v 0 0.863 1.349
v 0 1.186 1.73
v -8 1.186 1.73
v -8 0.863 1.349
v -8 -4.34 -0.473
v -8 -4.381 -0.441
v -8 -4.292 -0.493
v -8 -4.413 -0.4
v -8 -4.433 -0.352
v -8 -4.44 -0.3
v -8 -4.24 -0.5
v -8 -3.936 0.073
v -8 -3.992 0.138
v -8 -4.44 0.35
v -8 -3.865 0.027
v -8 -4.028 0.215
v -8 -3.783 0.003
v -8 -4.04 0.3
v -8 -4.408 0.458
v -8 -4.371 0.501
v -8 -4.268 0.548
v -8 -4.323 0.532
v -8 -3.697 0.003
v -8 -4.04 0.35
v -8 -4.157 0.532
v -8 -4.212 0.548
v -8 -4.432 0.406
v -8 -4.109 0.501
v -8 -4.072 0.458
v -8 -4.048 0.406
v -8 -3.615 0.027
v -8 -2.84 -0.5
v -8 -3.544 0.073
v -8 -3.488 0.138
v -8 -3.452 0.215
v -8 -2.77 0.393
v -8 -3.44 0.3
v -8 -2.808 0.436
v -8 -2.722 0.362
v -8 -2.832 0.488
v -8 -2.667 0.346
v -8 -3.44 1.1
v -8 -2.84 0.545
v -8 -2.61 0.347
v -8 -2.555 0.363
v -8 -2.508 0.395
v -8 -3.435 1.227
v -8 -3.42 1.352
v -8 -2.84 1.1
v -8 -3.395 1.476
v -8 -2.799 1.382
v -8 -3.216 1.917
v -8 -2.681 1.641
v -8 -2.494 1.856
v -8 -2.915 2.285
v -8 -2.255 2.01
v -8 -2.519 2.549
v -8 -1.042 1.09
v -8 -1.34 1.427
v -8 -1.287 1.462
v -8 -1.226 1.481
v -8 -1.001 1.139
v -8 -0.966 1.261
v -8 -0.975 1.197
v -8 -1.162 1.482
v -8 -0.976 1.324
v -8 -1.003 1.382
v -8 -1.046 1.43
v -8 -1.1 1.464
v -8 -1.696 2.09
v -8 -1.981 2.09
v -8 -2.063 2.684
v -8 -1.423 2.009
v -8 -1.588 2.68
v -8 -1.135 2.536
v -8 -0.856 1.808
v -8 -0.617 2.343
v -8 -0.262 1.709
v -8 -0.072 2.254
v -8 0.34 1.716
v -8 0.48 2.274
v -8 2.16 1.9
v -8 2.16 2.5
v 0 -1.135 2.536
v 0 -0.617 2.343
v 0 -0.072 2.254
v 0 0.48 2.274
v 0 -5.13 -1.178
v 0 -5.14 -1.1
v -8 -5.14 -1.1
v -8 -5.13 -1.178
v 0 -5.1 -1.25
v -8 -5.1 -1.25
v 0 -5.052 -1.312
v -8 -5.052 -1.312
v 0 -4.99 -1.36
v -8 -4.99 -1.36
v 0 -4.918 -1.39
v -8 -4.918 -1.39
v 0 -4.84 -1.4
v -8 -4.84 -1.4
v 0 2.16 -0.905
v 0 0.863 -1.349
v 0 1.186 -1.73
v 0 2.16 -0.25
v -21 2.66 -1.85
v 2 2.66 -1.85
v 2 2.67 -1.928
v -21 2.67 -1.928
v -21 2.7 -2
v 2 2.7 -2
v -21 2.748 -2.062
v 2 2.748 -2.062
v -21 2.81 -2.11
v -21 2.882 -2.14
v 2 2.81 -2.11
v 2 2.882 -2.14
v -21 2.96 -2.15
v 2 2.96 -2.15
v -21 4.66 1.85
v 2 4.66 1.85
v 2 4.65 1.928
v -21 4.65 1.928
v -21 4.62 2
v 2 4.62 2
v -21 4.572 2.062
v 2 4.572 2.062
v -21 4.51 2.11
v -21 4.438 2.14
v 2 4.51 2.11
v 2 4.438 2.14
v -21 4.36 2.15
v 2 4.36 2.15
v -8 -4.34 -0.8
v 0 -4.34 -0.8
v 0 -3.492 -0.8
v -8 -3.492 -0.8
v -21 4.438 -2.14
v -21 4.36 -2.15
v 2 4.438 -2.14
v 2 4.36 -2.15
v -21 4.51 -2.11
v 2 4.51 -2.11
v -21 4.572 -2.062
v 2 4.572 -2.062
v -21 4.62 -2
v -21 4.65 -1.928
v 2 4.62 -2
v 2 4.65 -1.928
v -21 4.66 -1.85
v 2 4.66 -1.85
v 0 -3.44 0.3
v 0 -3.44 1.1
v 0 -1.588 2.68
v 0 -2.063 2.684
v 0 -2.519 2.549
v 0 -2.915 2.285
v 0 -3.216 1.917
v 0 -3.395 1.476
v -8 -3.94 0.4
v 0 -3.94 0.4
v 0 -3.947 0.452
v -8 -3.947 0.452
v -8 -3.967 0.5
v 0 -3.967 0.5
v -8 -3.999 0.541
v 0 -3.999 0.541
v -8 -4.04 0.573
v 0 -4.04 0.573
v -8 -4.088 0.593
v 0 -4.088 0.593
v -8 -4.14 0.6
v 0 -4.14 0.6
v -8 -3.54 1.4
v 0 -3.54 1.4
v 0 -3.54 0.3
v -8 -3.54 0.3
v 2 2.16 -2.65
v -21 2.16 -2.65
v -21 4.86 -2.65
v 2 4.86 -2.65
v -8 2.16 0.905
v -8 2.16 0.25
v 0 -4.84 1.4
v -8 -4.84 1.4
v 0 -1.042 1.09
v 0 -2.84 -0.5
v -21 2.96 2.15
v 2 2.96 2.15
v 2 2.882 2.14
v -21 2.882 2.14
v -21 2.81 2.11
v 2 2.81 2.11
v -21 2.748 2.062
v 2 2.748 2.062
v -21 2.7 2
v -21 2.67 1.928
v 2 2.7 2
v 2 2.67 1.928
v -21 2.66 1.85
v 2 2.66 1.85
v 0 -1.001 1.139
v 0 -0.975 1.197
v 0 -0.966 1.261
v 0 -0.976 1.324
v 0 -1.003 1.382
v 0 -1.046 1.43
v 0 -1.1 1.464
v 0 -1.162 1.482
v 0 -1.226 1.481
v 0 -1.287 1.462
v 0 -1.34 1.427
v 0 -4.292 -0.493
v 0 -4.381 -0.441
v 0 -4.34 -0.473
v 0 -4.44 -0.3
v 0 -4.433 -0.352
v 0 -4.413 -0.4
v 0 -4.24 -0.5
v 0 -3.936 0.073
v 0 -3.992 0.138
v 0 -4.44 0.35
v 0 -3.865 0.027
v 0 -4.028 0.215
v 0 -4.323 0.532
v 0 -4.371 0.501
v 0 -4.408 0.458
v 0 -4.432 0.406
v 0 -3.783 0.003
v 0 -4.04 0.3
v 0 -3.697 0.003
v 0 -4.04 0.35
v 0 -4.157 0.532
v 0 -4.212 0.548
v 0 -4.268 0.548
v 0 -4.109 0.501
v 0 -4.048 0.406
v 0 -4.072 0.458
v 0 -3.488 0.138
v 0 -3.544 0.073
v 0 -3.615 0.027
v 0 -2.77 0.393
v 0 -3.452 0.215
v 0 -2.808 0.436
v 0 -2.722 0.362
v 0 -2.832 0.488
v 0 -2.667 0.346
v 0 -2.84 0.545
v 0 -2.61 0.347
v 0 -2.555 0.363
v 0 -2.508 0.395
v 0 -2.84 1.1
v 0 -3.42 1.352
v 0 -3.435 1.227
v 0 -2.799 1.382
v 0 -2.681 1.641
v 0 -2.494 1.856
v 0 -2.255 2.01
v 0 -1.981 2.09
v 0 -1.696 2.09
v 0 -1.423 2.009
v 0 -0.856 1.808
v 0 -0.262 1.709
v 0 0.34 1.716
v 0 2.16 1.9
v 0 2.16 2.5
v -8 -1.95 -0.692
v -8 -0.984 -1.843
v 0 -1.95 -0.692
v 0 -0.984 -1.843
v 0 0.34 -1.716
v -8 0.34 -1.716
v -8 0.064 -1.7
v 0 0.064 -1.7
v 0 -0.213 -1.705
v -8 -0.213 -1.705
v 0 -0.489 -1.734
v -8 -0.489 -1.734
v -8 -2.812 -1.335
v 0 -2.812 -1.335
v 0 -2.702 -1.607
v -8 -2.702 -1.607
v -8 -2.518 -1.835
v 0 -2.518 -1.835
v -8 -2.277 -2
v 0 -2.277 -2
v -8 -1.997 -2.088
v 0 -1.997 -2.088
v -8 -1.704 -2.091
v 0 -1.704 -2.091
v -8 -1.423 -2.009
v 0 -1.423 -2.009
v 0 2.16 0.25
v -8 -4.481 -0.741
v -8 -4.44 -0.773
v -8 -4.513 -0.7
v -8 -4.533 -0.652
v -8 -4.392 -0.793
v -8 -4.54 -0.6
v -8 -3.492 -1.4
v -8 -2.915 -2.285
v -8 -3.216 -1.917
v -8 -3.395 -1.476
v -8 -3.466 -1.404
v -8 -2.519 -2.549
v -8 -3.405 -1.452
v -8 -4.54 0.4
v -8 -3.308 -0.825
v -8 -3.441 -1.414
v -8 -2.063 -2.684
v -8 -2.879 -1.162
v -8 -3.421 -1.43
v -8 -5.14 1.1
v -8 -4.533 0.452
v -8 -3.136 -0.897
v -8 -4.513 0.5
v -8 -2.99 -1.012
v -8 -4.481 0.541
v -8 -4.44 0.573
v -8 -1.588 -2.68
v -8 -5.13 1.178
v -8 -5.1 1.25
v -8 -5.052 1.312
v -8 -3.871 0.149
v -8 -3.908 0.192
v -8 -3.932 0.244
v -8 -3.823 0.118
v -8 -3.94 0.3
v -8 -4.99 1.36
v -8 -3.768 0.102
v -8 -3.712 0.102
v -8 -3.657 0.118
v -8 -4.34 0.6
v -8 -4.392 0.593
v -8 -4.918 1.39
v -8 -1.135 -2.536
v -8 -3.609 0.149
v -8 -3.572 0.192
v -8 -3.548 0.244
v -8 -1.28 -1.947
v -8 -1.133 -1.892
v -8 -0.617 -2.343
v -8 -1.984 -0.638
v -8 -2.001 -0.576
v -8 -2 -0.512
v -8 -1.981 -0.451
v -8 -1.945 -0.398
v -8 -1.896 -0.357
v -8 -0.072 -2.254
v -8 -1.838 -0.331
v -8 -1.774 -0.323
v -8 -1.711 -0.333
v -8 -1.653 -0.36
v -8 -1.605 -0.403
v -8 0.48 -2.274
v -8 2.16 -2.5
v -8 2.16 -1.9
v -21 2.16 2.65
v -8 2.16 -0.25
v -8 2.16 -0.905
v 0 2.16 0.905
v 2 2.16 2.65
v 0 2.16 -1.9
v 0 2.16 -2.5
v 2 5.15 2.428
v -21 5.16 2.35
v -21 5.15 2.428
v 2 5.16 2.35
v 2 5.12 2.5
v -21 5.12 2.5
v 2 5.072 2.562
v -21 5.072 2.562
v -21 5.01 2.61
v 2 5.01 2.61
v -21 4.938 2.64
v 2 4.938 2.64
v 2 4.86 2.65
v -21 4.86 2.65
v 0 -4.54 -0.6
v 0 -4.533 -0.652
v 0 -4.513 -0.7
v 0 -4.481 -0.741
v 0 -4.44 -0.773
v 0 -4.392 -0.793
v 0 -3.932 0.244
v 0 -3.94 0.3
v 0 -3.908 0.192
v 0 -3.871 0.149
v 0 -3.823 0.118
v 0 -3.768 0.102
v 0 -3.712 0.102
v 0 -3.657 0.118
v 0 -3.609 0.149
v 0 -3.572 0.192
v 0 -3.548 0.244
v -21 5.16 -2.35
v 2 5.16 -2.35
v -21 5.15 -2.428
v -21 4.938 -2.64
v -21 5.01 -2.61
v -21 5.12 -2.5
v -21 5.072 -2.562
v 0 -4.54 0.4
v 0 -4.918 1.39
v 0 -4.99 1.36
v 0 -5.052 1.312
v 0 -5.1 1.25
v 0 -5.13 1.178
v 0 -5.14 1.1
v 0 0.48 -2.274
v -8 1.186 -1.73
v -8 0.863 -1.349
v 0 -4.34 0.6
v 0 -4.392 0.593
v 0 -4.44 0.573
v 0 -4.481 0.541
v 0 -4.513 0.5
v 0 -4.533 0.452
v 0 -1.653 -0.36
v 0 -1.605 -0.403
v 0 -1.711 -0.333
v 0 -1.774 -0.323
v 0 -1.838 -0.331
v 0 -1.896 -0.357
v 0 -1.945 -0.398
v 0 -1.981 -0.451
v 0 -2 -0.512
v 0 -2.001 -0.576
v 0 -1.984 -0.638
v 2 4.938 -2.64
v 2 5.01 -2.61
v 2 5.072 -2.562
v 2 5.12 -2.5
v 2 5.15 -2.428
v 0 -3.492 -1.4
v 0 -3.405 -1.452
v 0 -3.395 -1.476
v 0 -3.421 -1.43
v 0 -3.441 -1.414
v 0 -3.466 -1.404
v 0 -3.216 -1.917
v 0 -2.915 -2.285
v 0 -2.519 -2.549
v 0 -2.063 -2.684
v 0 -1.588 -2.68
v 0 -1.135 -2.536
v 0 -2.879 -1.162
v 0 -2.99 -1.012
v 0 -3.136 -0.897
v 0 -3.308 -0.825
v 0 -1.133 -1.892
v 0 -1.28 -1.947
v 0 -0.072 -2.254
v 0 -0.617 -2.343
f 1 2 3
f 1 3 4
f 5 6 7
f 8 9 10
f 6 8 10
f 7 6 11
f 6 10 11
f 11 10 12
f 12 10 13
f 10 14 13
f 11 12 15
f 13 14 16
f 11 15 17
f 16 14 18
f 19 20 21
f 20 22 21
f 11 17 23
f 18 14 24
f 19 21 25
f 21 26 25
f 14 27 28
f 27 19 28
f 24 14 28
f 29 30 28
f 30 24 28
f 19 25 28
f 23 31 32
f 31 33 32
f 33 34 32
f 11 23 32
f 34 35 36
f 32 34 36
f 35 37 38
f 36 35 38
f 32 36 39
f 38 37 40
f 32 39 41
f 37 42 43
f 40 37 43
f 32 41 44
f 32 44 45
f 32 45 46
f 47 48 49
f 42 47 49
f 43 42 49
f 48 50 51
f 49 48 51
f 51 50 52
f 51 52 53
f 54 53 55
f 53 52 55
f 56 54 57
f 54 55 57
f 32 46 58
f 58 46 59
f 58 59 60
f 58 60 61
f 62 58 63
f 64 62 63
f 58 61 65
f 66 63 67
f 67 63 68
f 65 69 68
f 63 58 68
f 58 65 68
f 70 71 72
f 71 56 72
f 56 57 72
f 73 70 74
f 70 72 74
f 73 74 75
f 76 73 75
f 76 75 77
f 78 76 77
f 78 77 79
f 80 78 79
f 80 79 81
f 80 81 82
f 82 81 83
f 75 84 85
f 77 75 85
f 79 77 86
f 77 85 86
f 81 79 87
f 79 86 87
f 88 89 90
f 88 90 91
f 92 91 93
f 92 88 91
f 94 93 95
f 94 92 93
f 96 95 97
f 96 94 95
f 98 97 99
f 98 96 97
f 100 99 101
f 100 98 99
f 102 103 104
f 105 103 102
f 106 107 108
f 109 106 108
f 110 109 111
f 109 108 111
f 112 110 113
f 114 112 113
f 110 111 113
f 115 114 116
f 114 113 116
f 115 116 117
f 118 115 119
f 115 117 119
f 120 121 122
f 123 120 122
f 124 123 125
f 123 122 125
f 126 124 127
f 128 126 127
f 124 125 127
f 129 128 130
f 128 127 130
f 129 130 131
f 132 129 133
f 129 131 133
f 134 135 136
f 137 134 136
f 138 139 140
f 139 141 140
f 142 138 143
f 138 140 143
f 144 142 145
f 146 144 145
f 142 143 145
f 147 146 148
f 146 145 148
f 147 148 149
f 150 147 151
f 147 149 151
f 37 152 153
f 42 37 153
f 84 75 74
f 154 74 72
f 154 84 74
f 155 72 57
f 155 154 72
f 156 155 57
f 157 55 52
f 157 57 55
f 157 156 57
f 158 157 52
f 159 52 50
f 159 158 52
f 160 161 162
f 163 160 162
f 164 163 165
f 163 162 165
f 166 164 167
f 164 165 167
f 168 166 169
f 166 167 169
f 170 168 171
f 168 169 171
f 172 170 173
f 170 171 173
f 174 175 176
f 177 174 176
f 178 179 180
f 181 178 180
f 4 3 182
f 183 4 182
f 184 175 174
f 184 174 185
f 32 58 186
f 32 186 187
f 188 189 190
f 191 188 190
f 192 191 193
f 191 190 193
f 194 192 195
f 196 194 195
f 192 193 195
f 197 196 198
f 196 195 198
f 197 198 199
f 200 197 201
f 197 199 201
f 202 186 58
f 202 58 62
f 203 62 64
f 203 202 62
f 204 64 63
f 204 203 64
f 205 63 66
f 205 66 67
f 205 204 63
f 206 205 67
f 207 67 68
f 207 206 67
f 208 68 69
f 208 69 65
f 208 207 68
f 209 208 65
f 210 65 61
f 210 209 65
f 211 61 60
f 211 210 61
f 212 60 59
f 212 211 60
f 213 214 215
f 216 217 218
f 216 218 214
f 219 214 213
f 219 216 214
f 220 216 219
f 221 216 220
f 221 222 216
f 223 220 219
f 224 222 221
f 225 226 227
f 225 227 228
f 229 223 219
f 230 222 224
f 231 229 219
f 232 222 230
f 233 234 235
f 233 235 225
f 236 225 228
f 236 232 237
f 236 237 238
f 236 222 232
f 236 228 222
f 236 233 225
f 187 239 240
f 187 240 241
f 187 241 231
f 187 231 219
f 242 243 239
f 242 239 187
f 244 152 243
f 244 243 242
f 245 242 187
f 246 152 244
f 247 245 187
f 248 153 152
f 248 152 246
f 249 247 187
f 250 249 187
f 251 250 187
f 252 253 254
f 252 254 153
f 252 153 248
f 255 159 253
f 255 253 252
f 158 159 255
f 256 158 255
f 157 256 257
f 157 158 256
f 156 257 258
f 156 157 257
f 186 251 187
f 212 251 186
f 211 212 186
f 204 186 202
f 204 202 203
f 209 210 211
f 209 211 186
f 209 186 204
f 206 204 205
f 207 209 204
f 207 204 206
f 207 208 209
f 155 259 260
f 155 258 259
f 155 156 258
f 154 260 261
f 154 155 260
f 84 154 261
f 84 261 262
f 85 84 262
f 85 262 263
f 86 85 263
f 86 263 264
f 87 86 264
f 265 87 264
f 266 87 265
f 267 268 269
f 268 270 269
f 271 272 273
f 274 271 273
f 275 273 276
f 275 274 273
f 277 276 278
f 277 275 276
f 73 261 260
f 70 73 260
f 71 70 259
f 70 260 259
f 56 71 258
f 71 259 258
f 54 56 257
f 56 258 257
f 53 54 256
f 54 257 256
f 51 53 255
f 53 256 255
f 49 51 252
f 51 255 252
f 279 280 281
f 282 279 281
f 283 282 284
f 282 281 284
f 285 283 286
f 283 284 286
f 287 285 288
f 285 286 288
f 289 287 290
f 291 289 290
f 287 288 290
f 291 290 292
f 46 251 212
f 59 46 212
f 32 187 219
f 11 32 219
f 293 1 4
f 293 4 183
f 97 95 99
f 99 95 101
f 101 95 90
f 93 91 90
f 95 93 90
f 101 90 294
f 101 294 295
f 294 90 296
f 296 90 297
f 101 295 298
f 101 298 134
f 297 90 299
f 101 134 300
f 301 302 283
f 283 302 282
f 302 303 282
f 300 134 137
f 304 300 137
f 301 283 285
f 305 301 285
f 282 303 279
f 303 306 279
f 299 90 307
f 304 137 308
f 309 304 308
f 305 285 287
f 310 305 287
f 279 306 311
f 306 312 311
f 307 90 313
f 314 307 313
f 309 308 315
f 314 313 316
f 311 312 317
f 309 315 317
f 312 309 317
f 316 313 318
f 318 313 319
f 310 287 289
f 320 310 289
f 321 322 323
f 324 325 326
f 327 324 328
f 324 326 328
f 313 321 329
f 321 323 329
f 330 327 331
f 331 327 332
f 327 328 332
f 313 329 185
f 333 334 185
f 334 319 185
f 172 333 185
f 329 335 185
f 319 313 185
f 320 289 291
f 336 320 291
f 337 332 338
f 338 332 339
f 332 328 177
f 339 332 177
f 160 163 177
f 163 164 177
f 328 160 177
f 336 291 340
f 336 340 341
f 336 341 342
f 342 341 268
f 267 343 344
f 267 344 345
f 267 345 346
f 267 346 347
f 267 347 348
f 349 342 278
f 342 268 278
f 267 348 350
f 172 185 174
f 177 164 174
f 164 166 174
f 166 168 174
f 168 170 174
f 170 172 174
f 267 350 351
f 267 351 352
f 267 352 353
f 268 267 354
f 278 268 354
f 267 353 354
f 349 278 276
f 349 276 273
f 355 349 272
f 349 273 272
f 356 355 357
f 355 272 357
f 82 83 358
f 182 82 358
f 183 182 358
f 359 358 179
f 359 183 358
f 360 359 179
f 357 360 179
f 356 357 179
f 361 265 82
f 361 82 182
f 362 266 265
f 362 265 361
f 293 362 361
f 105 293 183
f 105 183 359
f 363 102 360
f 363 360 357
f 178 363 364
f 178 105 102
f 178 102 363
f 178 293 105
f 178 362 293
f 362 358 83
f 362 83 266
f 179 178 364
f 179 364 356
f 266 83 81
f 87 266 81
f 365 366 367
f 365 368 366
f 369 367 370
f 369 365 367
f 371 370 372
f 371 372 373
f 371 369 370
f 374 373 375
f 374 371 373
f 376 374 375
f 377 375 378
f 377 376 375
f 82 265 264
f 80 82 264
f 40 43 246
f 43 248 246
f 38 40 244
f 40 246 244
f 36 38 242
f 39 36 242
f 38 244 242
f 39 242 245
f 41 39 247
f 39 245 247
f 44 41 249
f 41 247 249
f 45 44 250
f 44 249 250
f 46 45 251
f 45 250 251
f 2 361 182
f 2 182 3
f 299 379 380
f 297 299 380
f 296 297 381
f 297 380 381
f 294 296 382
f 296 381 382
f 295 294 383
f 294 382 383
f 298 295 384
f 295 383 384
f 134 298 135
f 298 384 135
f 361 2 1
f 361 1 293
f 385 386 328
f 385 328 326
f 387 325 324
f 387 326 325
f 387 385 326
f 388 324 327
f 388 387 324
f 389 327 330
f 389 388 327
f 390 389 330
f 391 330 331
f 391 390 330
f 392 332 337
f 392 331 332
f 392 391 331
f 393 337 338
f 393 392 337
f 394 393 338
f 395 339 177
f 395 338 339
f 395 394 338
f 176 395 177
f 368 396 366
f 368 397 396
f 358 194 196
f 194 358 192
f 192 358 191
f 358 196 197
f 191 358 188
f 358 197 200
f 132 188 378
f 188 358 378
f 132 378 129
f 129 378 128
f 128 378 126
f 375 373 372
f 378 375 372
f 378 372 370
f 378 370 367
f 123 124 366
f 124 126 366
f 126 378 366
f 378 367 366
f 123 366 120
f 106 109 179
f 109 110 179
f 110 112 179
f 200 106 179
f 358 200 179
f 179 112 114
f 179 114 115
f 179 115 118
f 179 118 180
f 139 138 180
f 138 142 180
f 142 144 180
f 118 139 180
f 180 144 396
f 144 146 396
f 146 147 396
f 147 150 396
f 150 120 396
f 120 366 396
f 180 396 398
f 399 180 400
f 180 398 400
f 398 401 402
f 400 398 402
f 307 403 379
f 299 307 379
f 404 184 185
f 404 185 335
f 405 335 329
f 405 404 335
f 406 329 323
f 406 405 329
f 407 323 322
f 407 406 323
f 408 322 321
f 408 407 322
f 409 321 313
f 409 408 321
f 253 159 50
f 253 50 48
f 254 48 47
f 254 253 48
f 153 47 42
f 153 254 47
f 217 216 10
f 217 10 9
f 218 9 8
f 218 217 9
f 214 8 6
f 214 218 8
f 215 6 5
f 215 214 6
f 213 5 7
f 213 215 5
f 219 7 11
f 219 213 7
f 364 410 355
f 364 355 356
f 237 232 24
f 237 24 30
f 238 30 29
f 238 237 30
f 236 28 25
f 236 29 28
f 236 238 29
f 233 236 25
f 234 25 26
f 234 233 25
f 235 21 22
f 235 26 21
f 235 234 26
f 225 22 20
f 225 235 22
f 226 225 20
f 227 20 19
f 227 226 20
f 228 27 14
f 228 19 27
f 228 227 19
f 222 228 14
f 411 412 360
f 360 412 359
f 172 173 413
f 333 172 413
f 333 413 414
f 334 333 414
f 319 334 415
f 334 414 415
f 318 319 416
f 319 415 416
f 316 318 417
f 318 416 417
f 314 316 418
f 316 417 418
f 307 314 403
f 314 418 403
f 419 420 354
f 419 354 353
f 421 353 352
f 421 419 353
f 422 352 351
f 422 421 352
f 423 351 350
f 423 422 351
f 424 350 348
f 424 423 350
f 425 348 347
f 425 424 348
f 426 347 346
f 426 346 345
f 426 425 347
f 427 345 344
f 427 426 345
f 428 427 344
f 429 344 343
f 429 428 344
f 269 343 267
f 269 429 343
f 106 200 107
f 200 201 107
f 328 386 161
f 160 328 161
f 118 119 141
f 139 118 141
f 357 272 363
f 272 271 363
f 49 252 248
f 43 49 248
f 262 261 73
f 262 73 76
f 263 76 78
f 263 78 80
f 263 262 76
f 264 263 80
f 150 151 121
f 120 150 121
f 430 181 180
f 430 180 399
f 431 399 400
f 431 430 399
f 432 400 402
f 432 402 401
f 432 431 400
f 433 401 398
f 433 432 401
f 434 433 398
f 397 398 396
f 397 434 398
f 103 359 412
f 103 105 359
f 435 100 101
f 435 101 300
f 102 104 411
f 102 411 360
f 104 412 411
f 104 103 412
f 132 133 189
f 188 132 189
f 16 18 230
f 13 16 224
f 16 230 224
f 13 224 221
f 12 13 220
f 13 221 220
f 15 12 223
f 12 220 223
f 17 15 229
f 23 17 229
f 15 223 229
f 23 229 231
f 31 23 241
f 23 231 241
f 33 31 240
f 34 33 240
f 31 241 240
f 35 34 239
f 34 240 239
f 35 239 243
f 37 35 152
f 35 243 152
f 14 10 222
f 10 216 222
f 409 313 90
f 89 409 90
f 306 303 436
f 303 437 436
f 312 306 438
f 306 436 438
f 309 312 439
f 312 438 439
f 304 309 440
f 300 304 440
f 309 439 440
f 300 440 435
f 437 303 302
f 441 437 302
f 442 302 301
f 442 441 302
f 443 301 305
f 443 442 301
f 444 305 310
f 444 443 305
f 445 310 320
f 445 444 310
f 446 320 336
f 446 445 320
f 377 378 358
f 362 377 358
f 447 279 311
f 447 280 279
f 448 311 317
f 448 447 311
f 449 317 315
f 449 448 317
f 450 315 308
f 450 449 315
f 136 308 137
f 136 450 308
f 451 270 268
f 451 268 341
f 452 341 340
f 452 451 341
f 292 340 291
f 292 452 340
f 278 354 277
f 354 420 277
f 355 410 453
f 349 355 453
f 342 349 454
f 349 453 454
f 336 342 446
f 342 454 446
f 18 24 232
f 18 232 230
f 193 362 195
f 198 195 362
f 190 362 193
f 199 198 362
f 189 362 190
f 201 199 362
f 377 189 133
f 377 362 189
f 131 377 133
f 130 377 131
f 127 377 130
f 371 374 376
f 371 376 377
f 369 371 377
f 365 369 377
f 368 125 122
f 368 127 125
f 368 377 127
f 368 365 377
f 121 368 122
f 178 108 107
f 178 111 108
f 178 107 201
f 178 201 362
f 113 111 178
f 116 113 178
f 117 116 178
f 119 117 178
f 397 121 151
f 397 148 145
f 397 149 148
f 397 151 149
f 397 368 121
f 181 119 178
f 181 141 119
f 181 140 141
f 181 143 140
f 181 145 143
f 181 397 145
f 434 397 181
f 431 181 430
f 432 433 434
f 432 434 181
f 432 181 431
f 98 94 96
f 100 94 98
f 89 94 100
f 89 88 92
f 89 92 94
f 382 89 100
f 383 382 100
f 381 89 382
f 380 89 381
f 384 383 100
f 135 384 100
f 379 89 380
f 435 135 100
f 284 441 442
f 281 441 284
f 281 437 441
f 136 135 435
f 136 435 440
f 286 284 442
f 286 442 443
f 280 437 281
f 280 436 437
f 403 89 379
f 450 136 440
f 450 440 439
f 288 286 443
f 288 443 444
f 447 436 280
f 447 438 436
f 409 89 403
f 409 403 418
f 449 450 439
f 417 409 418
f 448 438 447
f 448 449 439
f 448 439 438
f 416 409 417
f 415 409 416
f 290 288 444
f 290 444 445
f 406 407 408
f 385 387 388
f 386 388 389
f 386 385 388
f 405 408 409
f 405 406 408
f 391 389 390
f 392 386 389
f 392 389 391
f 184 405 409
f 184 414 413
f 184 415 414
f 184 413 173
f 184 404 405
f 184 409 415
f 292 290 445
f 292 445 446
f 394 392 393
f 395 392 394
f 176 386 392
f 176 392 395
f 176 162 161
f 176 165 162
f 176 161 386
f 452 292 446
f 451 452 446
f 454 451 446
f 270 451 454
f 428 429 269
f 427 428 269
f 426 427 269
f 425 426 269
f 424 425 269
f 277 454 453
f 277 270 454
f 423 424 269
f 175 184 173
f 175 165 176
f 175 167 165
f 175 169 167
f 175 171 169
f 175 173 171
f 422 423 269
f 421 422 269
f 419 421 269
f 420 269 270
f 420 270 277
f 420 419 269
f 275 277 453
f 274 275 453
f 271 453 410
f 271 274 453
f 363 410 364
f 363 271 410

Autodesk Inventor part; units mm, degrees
sketch "Sketch_11" plane through (0, 0, 0) normal (1, 0, 0) x (0, 1, 0)
  arc A0 (-1.1346, 2.5361) -> (-3.3951, 1.4765) centre (-1.84, 1.1) ccw
  arc A1 (-3.4923, 1.4) -> (-3.3951, 1.4765) centre (-3.4923, 1.5) ccw
  line L0 (-3.4923, 1.4) -> (-4.84, 1.4)
  arc A2 (-4.84, 1.4) -> (-5.14, 1.1) centre (-4.84, 1.1) ccw
  line L1 (-5.14, 1.1) -> (-5.14, -1.1)
  arc A3 (-5.14, -1.1) -> (-4.84, -1.4) centre (-4.84, -1.1) ccw
  line L2 (-4.84, -1.4) -> (-3.4923, -1.4)
  arc A4 (-3.3951, -1.4765) -> (-3.4923, -1.4) centre (-3.4923, -1.5) ccw
  arc A5 (-3.3951, -1.4765) -> (-1.1346, -2.5361) centre (-1.84, -1.1) ccw
  arc A6 (0.4796, -2.2735) -> (-1.1346, -2.5361) centre (0.1042, -5.0583) ccw
  line L3 (0.4796, -2.2735) -> (2.16, -2.5)
  line L4 (2.16, -2.5) -> (2.16, 2.5)
  line L5 (2.16, 2.5) -> (0.4796, 2.2735)
  arc A7 (-1.1346, 2.5361) -> (0.4796, 2.2735) centre (0.1042, 5.0583) ccw
  circle A8 centre (0, 0) radius 1.45
extrude "Extrusion1" add sketch "Sketch_11" against normal blind 8
sketch "Sketch_12" plane through (2, 0, 0) normal (1, 0, 0) x (0, 0, -1)
  line L0 (-2.65, 4.86) -> (-2.65, 2.16)
  line L1 (-2.65, 2.16) -> (2.65, 2.16)
  line L2 (2.65, 2.16) -> (2.65, 4.86)
  arc A0 (2.65, 4.86) -> (2.35, 5.16) centre (2.35, 4.86) ccw
  line L3 (2.35, 5.16) -> (-2.35, 5.16)
  arc A1 (-2.35, 5.16) -> (-2.65, 4.86) centre (-2.35, 4.86) ccw
extrude "Extrusion2" add sketch "Sketch_12" against normal blind 23
sketch "Sketch_13" plane through (2, 0, 0) normal (1, 0, 0) x (0, 0, -1)
  arc A0 (-2.15, 2.96) -> (-1.85, 2.66) centre (-1.85, 2.96) ccw
  line L0 (-1.85, 2.66) -> (1.85, 2.66)
  arc A1 (1.85, 2.66) -> (2.15, 2.96) centre (1.85, 2.96) ccw
  line L1 (2.15, 2.96) -> (2.15, 4.36)
  arc A2 (2.15, 4.36) -> (1.85, 4.66) centre (1.85, 4.36) ccw
  line L2 (1.85, 4.66) -> (-1.85, 4.66)
  arc A3 (-1.85, 4.66) -> (-2.15, 4.36) centre (-1.85, 4.36) ccw
  line L3 (-2.15, 4.36) -> (-2.15, 2.96)
extrude "Extrusion3" cut sketch "Sketch_13" against normal blind 23
sketch "Sketch_14" plane through (0, 0, 0) normal (1, 0, 0) x (0, 1, 0)
  arc A0 (-1.4233, 2.0091) -> (-2.84, 1.1) centre (-1.84, 1.1) ccw
  line L0 (-2.84, 1.1) -> (-2.84, 0.5446)
  arc A1 (-2.84, 0.5446) -> (-2.5075, 0.3948) centre (-2.64, 0.5446) ccw
  line L1 (-2.5075, 0.3948) -> (-1.3404, 1.4271)
  arc A2 (-1.0422, 1.09) -> (-1.3404, 1.4271) centre (-1.1913, 1.2585) ccw
  line L2 (-1.0422, 1.09) -> (-2.84, -0.5)
  line L3 (-2.84, -0.5) -> (-4.24, -0.5)
  arc A3 (-4.44, -0.3) -> (-4.24, -0.5) centre (-4.24, -0.3) ccw
  line L4 (-4.44, -0.3) -> (-4.44, 0.35)
  arc A4 (-4.24, 0.55) -> (-4.44, 0.35) centre (-4.24, 0.35) ccw
  arc A5 (-4.04, 0.35) -> (-4.24, 0.55) centre (-4.24, 0.35) ccw
  line L5 (-4.04, 0.35) -> (-4.04, 0.3)
  arc A6 (-4.04, 0.3) -> (-3.74, 0) centre (-3.74, 0.3) ccw
  arc A7 (-3.74, 0) -> (-3.44, 0.3) centre (-3.74, 0.3) ccw
  line L6 (-3.44, 0.3) -> (-3.44, 1.1)
  arc A8 (-3.1629, 2) -> (-3.44, 1.1) centre (-1.84, 1.1) ccw
  line L7 (-3.1629, 2) -> (-3.54, 2)
  line L8 (-3.54, 2) -> (-3.54, 0.3)
  arc A9 (-3.74, 0.1) -> (-3.54, 0.3) centre (-3.74, 0.3) ccw
  arc A10 (-3.94, 0.3) -> (-3.74, 0.1) centre (-3.74, 0.3) ccw
  line L9 (-3.94, 0.3) -> (-3.94, 0.4)
  arc A11 (-3.94, 0.4) -> (-4.14, 0.6) centre (-4.14, 0.4) ccw
  line L10 (-4.14, 0.6) -> (-4.34, 0.6)
  arc A12 (-4.34, 0.6) -> (-4.54, 0.4) centre (-4.34, 0.4) ccw
  line L11 (-4.54, 0.4) -> (-4.54, -0.6)
  arc A13 (-4.54, -0.6) -> (-4.34, -0.8) centre (-4.34, -0.6) ccw
  line L12 (-4.34, -0.8) -> (-3.4923, -0.8)
  arc A14 (-2.8119, -1.3353) -> (-3.4923, -0.8) centre (-3.4923, -1.5) ccw
  arc A15 (-2.8119, -1.3353) -> (-1.4233, -2.0091) centre (-1.84, -1.1) ccw
  arc A16 (-0.9842, -1.8433) -> (-1.4233, -2.0091) centre (-0.0025, -5.109) ccw
  line L13 (-0.9842, -1.8433) -> (-1.95, -0.6923)
  arc A17 (-1.6053, -0.403) -> (-1.95, -0.6923) centre (-1.7776, -0.5477) ccw
  line L14 (-1.6053, -0.403) -> (-0.4886, -1.7338)
  arc A18 (0.34, -1.7162) -> (-0.4886, -1.7338) centre (-0.0025, -5.109) ccw
  line L15 (0.34, -1.7162) -> (2.16, -1.9)
  line L16 (2.16, -1.9) -> (2.16, 1.9)
  line L17 (2.16, 1.9) -> (0.34, 1.7162)
  arc A19 (-1.4233, 2.0091) -> (0.34, 1.7162) centre (-0.0025, 5.109) ccw
extrude "Extrusion4" cut sketch "Sketch_14" against normal blind 8
sketch "Sketch_4" plane through (0, 0, 0) normal (1, 0, 0) x (0, 1, 0)
  line L0 (2.2363, -0.1854) -> (0.8628, -1.3489)
  line L1 (0.8628, -1.3489) -> (1.186, -1.7304)
  line L2 (1.186, -1.7304) -> (2.5595, -0.5669)
  line L3 (2.5595, -0.5669) -> (2.2363, -0.1854)
extrude "Extrusion5" add sketch "Sketch_4" against normal blind 8
sketch "Sketch_5" plane through (0, 0, 0) normal (1, 0, 0) x (0, 1, 0)
  line L0 (1.186, 1.7304) -> (0.8628, 1.3489)
  line L1 (0.8628, 1.3489) -> (2.2363, 0.1854)
  line L2 (2.2363, 0.1854) -> (2.5595, 0.5669)
  line L3 (2.5595, 0.5669) -> (1.186, 1.7304)
extrude "Extrusion6" add sketch "Sketch_5" against normal blind 8
ref_plane "CP_XY" through (2, 5.16, 0) normal (1, 0, 0) x (0, 0, -1)
ref_plane "CP_YZ" through (2, 5.16, 0) normal (0, 0, -1) x (0, 1, 0)
ref_plane "CP_ZX" through (2, 5.16, 0) normal (0, 1, 0) x (1, 0, 0)
ref_plane "KTN_XY" through (0, 0, 0) normal (1, 0, 0) x (0, 0, -1)
ref_plane "KTN_YZ" through (0, 0, 0) normal (0, 0, -1) x (0, 1, 0)
ref_plane "KTN_ZX" through (0, 0, 0) normal (0, 1, 0) x (1, 0, 0)
properties part number "1247168 ASCF-M-23-S DM 2.1-3.4"
